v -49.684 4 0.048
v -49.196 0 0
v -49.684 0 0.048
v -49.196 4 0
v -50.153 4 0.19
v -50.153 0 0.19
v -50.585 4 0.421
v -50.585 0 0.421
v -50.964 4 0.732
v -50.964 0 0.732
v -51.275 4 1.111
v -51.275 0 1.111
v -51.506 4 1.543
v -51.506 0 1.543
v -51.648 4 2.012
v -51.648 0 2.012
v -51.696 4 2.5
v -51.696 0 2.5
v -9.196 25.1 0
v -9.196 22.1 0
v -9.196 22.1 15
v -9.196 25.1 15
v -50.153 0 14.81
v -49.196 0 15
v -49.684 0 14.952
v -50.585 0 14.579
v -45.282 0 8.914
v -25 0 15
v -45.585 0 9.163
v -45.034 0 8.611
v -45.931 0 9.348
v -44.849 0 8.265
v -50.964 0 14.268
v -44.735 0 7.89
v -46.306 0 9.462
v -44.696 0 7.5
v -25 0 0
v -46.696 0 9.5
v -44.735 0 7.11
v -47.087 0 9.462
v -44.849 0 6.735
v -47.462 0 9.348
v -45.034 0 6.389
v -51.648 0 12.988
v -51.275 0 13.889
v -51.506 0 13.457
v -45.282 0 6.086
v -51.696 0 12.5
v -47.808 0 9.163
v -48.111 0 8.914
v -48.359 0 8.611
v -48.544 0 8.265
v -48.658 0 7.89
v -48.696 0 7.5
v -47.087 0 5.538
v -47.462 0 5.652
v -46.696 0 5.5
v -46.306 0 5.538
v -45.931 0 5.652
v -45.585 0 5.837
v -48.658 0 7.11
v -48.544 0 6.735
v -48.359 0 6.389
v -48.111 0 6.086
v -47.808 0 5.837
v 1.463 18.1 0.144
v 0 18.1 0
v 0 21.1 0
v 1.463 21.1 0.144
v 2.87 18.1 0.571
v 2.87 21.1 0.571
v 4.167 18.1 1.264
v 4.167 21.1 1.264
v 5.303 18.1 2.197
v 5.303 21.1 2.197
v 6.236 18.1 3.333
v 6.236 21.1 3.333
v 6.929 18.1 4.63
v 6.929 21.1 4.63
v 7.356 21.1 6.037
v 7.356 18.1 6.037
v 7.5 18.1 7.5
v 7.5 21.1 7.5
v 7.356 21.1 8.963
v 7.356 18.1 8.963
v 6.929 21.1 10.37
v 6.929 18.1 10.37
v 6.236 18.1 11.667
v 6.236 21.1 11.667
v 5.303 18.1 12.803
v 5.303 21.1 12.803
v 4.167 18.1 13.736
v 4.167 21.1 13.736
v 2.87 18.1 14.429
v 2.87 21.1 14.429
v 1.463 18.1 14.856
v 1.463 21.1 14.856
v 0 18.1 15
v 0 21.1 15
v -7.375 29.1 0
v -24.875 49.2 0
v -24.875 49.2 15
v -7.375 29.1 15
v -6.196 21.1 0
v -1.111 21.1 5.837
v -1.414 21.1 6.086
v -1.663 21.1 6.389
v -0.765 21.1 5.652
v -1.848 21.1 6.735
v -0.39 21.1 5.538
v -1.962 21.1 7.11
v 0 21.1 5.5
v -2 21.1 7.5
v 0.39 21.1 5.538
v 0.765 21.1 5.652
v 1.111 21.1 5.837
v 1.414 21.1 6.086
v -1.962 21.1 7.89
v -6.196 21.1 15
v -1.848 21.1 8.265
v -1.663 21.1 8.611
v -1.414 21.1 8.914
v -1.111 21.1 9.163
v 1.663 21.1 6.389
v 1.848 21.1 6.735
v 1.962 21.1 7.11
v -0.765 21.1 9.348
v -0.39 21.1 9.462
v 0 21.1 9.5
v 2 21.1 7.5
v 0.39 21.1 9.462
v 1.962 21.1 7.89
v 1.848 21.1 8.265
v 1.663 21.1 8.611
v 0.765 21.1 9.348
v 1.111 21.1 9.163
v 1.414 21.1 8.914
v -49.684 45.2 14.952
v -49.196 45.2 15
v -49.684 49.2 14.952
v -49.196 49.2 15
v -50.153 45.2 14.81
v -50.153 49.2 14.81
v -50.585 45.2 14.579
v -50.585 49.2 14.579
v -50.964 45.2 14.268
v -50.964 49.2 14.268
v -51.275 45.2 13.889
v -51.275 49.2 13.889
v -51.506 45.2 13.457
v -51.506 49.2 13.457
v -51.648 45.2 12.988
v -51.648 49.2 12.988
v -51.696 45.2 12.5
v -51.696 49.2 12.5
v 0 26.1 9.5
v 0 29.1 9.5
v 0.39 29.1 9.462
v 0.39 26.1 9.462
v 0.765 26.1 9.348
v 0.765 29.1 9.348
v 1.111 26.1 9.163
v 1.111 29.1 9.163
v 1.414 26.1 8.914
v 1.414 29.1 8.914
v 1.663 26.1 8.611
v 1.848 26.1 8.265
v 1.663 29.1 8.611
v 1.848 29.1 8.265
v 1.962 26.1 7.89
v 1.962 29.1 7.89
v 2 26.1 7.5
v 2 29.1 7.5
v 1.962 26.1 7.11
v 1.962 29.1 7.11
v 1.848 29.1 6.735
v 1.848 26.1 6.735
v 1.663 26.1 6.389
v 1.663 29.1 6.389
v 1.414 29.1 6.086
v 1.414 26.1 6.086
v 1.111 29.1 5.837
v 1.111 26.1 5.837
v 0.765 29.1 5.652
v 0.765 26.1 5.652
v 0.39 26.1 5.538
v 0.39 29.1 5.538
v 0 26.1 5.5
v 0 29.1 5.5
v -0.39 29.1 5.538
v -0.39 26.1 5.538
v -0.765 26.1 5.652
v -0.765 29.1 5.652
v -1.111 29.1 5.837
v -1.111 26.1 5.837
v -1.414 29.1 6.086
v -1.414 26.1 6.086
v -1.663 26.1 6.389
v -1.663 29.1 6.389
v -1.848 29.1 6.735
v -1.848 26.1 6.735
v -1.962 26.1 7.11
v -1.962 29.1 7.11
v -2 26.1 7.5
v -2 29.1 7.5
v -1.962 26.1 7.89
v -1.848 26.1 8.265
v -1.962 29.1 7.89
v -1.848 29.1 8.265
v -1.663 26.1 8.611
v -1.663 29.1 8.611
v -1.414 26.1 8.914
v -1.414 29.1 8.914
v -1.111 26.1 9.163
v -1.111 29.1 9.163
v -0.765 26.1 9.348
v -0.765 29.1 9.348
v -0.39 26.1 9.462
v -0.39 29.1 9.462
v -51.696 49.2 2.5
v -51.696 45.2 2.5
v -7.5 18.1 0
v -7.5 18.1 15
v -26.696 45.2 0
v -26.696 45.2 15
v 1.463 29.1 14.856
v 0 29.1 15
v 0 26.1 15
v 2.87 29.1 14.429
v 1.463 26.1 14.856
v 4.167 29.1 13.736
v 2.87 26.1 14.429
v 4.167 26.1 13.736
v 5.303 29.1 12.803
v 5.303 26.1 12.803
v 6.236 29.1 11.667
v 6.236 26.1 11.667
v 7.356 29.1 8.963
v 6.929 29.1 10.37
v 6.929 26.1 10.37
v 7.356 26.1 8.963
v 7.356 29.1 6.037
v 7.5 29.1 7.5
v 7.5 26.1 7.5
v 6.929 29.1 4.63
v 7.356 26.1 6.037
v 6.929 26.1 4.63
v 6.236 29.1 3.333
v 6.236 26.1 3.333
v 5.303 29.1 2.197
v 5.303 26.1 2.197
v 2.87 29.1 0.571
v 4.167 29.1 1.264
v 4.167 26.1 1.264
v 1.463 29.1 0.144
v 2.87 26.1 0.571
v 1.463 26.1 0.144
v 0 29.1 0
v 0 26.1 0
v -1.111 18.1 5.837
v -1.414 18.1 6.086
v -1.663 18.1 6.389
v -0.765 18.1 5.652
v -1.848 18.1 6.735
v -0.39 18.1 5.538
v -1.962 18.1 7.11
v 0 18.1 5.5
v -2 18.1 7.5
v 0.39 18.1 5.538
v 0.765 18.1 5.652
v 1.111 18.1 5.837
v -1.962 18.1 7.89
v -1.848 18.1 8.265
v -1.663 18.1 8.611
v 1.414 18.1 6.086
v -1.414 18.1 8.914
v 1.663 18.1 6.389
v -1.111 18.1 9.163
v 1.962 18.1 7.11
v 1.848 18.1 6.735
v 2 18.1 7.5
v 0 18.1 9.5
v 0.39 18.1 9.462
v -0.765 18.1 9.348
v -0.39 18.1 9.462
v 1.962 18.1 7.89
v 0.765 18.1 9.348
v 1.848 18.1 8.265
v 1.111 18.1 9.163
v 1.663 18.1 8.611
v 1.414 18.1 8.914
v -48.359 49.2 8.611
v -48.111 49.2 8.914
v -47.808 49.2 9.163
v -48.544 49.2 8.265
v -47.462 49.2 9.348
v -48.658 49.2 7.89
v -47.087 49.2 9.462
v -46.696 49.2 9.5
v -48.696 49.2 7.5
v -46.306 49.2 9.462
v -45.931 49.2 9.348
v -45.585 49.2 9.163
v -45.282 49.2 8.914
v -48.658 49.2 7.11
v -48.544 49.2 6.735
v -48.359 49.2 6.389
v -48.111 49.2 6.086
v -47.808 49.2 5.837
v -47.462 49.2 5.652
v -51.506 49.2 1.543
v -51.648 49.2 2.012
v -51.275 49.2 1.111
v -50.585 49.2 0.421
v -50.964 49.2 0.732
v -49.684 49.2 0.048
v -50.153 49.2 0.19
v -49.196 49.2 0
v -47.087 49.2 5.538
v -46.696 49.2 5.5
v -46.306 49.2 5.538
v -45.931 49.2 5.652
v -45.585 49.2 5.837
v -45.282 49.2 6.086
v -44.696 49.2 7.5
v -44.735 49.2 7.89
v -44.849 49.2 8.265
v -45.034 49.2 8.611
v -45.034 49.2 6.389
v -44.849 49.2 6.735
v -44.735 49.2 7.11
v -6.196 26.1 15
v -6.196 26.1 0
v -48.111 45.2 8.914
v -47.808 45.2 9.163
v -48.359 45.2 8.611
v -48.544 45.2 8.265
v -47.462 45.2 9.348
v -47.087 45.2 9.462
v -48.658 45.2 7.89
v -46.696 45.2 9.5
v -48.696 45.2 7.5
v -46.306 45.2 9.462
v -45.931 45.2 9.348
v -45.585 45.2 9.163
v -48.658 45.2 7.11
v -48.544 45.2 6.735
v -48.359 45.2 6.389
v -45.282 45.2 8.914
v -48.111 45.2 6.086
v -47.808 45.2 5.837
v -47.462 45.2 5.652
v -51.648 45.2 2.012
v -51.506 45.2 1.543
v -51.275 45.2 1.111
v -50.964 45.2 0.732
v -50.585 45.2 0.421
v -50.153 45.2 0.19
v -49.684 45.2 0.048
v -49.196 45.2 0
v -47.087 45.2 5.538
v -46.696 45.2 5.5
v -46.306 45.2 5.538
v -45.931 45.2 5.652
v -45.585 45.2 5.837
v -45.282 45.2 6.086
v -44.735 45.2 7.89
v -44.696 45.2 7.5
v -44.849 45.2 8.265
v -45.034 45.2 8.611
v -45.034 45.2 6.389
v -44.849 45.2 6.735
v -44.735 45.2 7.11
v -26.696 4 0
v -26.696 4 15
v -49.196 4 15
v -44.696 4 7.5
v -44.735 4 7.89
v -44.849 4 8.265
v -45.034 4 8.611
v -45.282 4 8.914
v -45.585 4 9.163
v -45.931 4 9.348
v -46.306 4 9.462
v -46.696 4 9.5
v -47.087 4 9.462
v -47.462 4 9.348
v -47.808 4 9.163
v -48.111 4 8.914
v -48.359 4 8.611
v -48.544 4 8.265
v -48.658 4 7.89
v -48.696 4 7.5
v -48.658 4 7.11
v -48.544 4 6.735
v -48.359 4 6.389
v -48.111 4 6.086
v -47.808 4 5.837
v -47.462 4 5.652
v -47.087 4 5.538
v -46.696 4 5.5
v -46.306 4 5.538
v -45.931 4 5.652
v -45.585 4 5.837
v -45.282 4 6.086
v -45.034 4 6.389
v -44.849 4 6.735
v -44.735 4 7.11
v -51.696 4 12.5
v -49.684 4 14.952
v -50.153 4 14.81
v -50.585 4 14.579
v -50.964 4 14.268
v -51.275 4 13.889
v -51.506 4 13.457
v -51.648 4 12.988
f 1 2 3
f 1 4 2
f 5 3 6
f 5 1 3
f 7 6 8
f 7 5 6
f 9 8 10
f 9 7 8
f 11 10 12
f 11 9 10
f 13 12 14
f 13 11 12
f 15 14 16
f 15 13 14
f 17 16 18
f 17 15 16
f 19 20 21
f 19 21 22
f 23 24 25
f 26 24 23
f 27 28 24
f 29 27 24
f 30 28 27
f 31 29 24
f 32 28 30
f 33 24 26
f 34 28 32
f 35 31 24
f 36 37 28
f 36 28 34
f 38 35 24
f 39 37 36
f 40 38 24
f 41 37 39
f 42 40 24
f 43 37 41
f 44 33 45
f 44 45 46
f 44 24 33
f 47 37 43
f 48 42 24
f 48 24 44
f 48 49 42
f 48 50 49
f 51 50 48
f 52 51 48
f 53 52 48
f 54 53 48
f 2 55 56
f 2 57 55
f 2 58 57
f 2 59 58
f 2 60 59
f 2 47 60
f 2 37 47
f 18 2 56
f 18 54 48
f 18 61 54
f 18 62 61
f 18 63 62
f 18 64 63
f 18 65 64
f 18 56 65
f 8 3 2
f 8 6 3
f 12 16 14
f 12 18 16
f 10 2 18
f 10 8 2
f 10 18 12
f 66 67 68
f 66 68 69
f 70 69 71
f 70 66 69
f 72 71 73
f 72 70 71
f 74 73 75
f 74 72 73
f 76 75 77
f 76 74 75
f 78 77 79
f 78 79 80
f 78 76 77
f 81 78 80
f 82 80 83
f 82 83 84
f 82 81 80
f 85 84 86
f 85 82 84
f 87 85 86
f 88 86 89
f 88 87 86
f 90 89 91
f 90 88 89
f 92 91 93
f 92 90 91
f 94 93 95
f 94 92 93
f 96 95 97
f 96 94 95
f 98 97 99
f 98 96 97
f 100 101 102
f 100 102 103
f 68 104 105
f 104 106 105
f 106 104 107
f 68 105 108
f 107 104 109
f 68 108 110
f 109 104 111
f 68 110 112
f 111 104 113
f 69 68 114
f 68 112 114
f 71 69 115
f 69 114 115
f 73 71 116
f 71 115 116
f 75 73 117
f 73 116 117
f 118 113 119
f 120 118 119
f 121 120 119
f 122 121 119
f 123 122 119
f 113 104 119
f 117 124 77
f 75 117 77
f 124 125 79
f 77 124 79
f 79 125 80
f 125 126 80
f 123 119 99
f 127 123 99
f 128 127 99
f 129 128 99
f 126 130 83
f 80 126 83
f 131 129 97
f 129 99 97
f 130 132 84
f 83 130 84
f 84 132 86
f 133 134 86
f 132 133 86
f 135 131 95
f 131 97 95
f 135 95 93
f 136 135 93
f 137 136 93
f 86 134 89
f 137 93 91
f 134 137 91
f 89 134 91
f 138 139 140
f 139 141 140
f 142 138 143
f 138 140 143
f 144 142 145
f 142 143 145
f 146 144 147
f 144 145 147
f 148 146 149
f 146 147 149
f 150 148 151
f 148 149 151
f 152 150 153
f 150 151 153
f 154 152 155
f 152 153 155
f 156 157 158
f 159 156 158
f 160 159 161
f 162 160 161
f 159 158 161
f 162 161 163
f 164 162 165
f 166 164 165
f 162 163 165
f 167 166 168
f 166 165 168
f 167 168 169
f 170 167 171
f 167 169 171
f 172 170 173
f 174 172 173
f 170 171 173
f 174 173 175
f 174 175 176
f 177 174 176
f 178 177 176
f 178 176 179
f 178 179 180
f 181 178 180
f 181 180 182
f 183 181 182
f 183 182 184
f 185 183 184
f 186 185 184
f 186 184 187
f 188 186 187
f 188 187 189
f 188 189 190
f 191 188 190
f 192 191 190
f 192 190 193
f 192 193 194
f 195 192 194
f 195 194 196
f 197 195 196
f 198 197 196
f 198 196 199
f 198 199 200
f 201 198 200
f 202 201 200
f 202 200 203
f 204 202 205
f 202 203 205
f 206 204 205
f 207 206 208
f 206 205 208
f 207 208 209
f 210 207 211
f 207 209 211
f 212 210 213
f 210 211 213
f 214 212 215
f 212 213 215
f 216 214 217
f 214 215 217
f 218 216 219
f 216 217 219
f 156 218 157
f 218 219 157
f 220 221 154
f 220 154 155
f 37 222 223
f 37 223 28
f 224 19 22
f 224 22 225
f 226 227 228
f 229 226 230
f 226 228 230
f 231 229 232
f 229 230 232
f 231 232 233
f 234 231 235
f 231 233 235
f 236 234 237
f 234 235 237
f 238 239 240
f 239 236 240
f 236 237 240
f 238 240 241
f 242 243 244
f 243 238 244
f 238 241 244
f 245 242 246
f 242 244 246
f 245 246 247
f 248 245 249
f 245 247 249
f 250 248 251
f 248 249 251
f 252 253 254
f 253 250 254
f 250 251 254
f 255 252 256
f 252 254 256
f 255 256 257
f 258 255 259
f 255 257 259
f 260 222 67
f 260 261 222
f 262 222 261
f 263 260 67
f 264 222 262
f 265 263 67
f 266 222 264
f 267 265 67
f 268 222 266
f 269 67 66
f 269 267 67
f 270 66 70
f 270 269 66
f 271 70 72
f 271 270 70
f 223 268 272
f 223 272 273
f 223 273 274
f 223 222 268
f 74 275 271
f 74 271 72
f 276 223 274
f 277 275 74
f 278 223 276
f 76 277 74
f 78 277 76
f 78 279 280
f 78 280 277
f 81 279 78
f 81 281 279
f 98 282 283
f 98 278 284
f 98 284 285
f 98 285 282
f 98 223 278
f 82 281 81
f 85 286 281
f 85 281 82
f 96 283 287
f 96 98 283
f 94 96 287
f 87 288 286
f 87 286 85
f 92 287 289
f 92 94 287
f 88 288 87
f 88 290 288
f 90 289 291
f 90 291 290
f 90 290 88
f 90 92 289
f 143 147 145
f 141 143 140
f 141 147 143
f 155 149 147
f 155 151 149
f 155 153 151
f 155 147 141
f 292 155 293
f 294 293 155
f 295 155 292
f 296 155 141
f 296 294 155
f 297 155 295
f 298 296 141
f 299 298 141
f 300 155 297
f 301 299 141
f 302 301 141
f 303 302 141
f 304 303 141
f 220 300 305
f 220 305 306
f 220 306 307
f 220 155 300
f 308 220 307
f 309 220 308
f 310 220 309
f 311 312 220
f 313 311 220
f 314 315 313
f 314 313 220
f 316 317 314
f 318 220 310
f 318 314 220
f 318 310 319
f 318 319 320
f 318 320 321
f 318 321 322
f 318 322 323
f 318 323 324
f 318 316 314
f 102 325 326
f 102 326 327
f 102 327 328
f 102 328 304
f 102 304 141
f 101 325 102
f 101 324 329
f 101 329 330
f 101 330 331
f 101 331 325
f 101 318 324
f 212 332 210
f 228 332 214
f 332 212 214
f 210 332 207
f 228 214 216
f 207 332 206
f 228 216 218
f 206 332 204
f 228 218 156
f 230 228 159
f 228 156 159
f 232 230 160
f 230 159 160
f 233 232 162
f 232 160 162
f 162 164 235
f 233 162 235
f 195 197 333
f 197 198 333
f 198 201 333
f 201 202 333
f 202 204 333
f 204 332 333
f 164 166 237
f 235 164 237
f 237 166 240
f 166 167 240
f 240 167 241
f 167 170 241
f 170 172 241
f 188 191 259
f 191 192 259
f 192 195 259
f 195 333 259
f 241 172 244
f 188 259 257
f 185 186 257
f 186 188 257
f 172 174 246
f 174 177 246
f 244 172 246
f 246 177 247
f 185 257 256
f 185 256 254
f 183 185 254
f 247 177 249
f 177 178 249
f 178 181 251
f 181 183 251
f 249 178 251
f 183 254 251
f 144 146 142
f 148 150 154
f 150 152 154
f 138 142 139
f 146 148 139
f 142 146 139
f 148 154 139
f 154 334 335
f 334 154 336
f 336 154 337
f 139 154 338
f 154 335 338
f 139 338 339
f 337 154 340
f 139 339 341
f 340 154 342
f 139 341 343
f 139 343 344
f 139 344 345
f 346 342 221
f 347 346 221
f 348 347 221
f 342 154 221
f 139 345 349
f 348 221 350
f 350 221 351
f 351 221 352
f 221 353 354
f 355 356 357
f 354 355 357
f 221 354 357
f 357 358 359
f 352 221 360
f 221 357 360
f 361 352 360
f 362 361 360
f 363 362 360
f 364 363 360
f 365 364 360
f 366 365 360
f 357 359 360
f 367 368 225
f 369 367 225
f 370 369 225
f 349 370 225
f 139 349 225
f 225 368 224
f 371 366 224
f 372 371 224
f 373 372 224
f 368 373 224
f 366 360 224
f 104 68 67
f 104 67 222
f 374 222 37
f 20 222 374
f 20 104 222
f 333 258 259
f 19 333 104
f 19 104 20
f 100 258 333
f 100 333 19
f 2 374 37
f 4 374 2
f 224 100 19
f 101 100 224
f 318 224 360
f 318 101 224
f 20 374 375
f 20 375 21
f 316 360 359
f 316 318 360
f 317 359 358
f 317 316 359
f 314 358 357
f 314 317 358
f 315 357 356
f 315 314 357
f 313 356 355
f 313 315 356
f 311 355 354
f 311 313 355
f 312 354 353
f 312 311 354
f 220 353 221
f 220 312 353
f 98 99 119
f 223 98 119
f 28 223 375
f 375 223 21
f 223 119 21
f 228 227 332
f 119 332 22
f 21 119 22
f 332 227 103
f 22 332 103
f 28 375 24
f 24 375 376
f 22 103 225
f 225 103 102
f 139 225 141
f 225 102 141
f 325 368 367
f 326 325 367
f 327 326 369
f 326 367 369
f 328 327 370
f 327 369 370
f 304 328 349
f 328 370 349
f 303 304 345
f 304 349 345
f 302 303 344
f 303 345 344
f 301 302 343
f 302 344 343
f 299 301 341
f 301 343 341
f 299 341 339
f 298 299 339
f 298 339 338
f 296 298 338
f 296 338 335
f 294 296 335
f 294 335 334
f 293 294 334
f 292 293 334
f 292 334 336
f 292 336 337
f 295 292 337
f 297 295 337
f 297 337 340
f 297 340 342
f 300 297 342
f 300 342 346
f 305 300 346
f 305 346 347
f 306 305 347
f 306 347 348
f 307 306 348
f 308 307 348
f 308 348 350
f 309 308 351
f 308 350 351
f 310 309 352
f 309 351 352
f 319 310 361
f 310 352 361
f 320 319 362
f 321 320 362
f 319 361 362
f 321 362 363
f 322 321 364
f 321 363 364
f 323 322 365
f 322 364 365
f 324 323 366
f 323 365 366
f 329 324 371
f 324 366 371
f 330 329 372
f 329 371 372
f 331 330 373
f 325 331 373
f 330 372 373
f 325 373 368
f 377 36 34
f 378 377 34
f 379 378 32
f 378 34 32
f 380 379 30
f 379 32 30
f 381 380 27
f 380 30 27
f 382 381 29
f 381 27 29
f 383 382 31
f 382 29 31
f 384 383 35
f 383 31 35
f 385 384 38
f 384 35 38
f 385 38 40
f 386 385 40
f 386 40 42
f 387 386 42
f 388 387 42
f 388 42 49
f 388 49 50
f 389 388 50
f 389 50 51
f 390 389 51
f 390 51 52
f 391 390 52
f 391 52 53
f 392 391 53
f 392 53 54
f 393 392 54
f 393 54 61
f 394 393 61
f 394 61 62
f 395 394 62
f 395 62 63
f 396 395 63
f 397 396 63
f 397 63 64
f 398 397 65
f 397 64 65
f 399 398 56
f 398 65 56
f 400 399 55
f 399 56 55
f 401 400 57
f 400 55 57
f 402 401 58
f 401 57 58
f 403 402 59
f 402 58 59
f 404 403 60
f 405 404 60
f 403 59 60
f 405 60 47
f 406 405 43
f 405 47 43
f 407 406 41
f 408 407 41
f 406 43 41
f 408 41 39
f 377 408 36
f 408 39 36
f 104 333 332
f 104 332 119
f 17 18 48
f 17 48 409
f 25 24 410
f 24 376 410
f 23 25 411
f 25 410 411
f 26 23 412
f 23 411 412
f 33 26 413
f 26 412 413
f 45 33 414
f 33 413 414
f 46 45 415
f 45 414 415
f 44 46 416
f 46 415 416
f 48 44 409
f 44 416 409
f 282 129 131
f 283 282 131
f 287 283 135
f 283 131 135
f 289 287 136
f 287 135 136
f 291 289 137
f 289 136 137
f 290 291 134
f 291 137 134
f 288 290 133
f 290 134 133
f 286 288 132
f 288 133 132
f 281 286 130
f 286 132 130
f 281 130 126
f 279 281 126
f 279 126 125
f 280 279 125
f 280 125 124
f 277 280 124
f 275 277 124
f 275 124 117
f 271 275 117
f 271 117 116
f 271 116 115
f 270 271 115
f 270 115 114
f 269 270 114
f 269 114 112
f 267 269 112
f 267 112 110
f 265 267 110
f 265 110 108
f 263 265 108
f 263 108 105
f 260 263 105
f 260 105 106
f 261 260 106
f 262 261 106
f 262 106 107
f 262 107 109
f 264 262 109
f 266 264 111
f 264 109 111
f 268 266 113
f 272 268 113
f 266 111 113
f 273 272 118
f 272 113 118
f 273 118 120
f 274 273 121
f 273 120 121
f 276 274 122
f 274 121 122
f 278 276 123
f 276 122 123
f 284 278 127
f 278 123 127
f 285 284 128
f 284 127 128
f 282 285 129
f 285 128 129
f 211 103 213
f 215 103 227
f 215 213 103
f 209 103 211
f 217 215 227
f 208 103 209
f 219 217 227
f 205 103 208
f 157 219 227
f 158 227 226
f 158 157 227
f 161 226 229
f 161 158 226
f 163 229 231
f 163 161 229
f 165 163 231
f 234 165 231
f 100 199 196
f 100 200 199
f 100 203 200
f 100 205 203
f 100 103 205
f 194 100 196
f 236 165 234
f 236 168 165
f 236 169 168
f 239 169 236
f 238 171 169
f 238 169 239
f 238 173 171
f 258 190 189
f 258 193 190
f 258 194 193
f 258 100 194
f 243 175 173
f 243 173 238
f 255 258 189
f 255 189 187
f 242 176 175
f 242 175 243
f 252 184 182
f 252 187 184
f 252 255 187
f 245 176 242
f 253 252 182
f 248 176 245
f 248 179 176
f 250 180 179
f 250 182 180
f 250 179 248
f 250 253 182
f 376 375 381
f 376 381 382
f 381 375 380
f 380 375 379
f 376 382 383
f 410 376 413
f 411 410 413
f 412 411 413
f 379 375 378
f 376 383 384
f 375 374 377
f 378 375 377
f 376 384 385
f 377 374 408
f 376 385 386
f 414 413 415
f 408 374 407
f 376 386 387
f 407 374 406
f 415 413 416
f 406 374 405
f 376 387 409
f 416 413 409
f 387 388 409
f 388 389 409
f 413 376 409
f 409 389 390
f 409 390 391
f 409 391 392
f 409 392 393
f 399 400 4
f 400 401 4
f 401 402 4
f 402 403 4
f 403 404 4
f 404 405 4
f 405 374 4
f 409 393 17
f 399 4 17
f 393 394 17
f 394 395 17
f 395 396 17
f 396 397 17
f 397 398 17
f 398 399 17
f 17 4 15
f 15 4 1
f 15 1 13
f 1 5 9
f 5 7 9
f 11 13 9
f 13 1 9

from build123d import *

# Parameters (mm, degrees)
EXTRUDE_1_DEPTH     = 15
CUT_EXTRUDE_1_REACH = 74.926
SKETCH_2_R          = 2
SKETCH_3_R          = 7.5
EXTRUDE_2_DEPTH     = 3
EXTRUDE_START       = -3
SKETCH_4_R          = 7.5
EXTRUDE_3_DEPTH     = 3
SKETCH_5_R          = 2
CUT_EXTRUDE_2_DEPTH = 11
FILLET_1_R          = 2.5


with BuildPart() as part:
    # 草圖1 → 填料-伸長1 (new body)
    with BuildSketch(Plane.XY):
        Polygon((-26.696480976, 45.2), (-47.696480976, 45.2), (-51.696480976, 45.2), (-51.696480976, 49.2), (-24.875445442, 49.2), (-7.375445442, 29.1), (0, 29.1), (0, 26.1), (-6.196480976, 26.1), (-6.196480976, 21.1), (0, 21.1), (0, 18.1), (-7.5, 18.1), (-25, 0), (-51.696480976, 0), (-51.696480976, 4), (-47.696480976, 4), (-26.696480976, 4), (-9.196480976, 22.1), (-9.196480976, 25.1), align=None)
    extrude(amount=EXTRUDE_1_DEPTH)

    # 除料-伸長1: up to this face of the body (flat: up to its plane)
    cut_extrude_1_end = Plane(part.part.faces().sort_by_distance((-38.285963209, 49.2, 7.5))[0])
    # 草圖2 → 除料-伸長1 (cut, up to the picked face)
    with BuildSketch(Plane.XZ, mode=Mode.PRIVATE) as cut_extrude_1_sk1:
        with Locations((-46.696480976, 7.5)):
            Circle(SKETCH_2_R)
    cut_extrude_1_tool1 = split(extrude(cut_extrude_1_sk1.sketch, amount=-CUT_EXTRUDE_1_REACH, mode=Mode.PRIVATE), bisect_by=cut_extrude_1_end, keep=Keep.BOTH, mode=Mode.PRIVATE)
    add(cut_extrude_1_tool1.solids().sort_by(Axis((-46.696481, 0, 7.5), (0, 1, 0)))[0], mode=Mode.SUBTRACT)

    # 草圖3 → 填料-伸長2 (add)
    with BuildSketch(Plane.XZ.offset(-18.1)):
        with Locations((0, 7.5)):
            Circle(SKETCH_3_R)
    extrude(amount=-EXTRUDE_2_DEPTH)

    # 草圖4 → 填料-伸長3 (add)
    with BuildSketch(Plane(origin=(0, 29.1, 0), x_dir=(1, 0, 0), z_dir=(0, 1, 0)).offset(EXTRUDE_START)):
        with Locations((0, -7.5)):
            Circle(SKETCH_4_R)
    extrude(amount=EXTRUDE_3_DEPTH)

    # 草圖5 → 除料-伸長2 (cut)
    with BuildSketch(Plane(origin=(0, 29.1, 0), x_dir=(1, 0, 0), z_dir=(0, 1, 0))):
        with Locations(Location((0, -7.5, 0), (0, 0, 270))):
            Circle(SKETCH_5_R)
    extrude(amount=-CUT_EXTRUDE_2_DEPTH, mode=Mode.SUBTRACT)

    # 圓角1
    fillet_1_edges = [part.edges().sort_by_distance(p)[0] for p in [
        (-51.696480976, 47.2, 0),
        (-51.696480976, 2, 15),
        (-51.696480976, 2, 0),
        (-51.696480976, 47.2, 15),
    ]]
    fillet(fillet_1_edges, radius=FILLET_1_R)


solid = part.part
